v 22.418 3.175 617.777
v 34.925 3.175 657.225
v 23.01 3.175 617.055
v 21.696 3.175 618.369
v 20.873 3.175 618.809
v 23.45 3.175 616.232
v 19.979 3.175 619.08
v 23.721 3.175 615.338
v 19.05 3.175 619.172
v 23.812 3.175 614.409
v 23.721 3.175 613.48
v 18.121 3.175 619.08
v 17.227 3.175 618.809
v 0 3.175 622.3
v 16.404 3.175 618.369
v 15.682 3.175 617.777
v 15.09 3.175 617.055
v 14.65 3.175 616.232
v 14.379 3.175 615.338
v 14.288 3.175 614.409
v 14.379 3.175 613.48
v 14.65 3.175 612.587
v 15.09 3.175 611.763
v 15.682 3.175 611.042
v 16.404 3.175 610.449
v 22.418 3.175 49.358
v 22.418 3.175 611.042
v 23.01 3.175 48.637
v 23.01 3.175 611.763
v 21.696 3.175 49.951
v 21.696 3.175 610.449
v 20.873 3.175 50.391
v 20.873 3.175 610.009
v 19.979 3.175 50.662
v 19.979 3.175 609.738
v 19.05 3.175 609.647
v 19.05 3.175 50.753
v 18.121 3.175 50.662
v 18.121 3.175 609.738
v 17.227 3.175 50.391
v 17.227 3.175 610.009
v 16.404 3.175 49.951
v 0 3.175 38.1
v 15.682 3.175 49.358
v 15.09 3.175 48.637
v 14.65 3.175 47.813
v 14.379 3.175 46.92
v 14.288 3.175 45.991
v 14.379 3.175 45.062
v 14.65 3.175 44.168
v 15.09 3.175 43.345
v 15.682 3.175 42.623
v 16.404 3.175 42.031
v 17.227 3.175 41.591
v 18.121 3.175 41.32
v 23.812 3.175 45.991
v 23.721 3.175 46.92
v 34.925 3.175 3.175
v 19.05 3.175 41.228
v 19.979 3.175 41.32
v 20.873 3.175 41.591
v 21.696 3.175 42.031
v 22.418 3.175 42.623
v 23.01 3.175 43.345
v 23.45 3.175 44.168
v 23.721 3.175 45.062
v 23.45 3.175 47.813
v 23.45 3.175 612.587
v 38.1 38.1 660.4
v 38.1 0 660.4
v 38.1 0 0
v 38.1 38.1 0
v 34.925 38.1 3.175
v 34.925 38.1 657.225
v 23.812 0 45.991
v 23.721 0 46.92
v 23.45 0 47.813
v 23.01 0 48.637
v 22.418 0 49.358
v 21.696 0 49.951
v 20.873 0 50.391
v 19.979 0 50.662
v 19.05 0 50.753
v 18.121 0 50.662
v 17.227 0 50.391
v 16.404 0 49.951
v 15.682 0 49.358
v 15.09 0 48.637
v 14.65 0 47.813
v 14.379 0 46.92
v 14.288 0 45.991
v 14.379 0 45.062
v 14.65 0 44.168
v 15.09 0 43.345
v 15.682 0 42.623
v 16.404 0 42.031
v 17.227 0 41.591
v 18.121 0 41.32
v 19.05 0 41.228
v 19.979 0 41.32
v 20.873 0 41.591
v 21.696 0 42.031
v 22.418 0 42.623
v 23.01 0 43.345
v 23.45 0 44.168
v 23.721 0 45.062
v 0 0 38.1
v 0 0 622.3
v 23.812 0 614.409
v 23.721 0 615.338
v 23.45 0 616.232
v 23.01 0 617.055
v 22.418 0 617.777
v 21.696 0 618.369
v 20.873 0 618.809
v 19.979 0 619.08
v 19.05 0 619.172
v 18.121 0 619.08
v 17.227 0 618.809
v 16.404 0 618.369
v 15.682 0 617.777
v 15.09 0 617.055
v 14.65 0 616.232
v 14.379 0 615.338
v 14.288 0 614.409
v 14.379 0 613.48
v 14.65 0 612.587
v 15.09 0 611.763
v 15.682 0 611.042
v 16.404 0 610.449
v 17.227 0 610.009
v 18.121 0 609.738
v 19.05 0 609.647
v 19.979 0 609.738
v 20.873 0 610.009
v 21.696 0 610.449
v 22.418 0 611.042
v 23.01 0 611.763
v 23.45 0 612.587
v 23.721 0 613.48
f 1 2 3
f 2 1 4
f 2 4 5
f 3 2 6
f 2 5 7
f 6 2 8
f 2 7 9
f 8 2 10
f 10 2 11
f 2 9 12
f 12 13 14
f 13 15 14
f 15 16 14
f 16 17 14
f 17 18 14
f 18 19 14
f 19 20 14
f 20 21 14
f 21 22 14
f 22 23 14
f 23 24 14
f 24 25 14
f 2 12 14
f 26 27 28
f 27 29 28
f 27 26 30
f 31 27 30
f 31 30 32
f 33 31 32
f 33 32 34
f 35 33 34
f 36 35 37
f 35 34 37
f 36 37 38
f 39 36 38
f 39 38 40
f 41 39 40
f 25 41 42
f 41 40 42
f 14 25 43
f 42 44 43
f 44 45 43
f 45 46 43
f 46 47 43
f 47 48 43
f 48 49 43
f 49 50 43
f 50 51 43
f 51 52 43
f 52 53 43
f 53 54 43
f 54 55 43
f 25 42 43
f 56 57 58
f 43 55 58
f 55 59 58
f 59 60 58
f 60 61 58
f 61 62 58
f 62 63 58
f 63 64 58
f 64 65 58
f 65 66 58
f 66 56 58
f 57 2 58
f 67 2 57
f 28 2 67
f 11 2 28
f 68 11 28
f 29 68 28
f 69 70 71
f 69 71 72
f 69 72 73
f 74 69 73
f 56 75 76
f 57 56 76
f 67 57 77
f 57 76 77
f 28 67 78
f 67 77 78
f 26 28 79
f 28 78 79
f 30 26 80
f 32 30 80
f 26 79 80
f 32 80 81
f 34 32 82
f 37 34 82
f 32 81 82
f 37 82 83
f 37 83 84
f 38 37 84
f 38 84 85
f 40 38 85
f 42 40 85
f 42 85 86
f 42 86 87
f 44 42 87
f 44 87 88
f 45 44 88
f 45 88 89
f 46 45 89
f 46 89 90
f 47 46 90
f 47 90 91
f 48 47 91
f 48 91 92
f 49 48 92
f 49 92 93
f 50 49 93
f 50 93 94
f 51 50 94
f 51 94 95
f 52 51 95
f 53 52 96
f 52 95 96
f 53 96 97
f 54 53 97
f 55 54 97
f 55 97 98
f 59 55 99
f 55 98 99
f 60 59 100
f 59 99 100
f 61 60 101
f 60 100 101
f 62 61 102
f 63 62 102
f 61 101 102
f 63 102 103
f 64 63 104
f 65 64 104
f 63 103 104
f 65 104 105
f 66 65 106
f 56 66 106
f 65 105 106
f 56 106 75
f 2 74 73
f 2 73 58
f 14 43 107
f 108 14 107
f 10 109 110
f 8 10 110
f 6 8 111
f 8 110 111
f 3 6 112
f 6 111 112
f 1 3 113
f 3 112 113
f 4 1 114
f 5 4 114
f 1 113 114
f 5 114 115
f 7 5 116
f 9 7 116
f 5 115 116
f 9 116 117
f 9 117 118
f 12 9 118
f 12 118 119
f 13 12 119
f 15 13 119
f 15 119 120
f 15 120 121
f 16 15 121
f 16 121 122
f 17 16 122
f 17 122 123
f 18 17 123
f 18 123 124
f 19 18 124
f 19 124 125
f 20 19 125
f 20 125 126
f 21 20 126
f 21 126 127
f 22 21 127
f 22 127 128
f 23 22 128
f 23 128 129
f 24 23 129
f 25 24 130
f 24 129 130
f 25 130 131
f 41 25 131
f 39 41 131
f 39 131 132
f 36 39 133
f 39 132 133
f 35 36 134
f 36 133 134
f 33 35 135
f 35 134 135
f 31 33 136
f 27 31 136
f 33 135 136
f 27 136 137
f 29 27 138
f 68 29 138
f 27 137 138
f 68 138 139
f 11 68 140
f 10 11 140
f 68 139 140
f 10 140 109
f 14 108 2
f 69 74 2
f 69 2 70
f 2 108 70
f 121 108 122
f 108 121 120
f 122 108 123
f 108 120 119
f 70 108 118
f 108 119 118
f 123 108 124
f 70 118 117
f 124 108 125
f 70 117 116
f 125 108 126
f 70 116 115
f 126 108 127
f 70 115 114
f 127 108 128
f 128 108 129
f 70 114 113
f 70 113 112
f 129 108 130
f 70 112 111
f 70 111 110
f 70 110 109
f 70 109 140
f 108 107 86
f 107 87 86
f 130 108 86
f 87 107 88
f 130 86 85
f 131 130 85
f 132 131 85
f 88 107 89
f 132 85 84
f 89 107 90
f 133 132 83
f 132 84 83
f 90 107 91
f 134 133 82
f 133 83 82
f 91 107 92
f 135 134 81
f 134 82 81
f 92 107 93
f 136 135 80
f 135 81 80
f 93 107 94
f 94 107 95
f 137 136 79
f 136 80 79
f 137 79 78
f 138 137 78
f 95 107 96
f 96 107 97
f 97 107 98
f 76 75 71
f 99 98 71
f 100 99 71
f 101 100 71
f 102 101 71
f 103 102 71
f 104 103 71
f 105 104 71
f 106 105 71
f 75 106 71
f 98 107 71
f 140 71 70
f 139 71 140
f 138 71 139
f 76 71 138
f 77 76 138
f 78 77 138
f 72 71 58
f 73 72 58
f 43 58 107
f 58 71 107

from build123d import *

# Parameters (mm, degrees)
F1_DEPTH = 660.4
F3_DEPTH = 38.101
F4_R     = 4.7625
F5_DEPTH = 38.101


with BuildPart() as f1:
    # F0 (on Top) → F1 (new body)
    with BuildSketch(Plane.XY):
        Polygon((0, 3.175), (0, 0), (38.1, 0), (38.1, 38.1), (34.925, 38.1), (34.925, 3.175), align=None)
    extrude(amount=F1_DEPTH)

    # F2 (on face) → F3 (cut, through all)
    with BuildSketch(Plane.XZ):
        Polygon((0, 622.3), (38.1, 660.4), (0, 660.4), align=None)
        Polygon((0, 0), (38.1, 0), (0, 38.1), align=None)
    extrude(amount=-F3_DEPTH, mode=Mode.SUBTRACT)

    # F4 (on face) → F5 (cut, through all)
    with BuildSketch(Plane.XZ):
        with Locations((19.05, 45.990768)):
            Circle(F4_R)
        with Locations((19.05, 614.409232)):
            Circle(F4_R)
    extrude(amount=-F5_DEPTH, mode=Mode.SUBTRACT)


solid = f1.part
